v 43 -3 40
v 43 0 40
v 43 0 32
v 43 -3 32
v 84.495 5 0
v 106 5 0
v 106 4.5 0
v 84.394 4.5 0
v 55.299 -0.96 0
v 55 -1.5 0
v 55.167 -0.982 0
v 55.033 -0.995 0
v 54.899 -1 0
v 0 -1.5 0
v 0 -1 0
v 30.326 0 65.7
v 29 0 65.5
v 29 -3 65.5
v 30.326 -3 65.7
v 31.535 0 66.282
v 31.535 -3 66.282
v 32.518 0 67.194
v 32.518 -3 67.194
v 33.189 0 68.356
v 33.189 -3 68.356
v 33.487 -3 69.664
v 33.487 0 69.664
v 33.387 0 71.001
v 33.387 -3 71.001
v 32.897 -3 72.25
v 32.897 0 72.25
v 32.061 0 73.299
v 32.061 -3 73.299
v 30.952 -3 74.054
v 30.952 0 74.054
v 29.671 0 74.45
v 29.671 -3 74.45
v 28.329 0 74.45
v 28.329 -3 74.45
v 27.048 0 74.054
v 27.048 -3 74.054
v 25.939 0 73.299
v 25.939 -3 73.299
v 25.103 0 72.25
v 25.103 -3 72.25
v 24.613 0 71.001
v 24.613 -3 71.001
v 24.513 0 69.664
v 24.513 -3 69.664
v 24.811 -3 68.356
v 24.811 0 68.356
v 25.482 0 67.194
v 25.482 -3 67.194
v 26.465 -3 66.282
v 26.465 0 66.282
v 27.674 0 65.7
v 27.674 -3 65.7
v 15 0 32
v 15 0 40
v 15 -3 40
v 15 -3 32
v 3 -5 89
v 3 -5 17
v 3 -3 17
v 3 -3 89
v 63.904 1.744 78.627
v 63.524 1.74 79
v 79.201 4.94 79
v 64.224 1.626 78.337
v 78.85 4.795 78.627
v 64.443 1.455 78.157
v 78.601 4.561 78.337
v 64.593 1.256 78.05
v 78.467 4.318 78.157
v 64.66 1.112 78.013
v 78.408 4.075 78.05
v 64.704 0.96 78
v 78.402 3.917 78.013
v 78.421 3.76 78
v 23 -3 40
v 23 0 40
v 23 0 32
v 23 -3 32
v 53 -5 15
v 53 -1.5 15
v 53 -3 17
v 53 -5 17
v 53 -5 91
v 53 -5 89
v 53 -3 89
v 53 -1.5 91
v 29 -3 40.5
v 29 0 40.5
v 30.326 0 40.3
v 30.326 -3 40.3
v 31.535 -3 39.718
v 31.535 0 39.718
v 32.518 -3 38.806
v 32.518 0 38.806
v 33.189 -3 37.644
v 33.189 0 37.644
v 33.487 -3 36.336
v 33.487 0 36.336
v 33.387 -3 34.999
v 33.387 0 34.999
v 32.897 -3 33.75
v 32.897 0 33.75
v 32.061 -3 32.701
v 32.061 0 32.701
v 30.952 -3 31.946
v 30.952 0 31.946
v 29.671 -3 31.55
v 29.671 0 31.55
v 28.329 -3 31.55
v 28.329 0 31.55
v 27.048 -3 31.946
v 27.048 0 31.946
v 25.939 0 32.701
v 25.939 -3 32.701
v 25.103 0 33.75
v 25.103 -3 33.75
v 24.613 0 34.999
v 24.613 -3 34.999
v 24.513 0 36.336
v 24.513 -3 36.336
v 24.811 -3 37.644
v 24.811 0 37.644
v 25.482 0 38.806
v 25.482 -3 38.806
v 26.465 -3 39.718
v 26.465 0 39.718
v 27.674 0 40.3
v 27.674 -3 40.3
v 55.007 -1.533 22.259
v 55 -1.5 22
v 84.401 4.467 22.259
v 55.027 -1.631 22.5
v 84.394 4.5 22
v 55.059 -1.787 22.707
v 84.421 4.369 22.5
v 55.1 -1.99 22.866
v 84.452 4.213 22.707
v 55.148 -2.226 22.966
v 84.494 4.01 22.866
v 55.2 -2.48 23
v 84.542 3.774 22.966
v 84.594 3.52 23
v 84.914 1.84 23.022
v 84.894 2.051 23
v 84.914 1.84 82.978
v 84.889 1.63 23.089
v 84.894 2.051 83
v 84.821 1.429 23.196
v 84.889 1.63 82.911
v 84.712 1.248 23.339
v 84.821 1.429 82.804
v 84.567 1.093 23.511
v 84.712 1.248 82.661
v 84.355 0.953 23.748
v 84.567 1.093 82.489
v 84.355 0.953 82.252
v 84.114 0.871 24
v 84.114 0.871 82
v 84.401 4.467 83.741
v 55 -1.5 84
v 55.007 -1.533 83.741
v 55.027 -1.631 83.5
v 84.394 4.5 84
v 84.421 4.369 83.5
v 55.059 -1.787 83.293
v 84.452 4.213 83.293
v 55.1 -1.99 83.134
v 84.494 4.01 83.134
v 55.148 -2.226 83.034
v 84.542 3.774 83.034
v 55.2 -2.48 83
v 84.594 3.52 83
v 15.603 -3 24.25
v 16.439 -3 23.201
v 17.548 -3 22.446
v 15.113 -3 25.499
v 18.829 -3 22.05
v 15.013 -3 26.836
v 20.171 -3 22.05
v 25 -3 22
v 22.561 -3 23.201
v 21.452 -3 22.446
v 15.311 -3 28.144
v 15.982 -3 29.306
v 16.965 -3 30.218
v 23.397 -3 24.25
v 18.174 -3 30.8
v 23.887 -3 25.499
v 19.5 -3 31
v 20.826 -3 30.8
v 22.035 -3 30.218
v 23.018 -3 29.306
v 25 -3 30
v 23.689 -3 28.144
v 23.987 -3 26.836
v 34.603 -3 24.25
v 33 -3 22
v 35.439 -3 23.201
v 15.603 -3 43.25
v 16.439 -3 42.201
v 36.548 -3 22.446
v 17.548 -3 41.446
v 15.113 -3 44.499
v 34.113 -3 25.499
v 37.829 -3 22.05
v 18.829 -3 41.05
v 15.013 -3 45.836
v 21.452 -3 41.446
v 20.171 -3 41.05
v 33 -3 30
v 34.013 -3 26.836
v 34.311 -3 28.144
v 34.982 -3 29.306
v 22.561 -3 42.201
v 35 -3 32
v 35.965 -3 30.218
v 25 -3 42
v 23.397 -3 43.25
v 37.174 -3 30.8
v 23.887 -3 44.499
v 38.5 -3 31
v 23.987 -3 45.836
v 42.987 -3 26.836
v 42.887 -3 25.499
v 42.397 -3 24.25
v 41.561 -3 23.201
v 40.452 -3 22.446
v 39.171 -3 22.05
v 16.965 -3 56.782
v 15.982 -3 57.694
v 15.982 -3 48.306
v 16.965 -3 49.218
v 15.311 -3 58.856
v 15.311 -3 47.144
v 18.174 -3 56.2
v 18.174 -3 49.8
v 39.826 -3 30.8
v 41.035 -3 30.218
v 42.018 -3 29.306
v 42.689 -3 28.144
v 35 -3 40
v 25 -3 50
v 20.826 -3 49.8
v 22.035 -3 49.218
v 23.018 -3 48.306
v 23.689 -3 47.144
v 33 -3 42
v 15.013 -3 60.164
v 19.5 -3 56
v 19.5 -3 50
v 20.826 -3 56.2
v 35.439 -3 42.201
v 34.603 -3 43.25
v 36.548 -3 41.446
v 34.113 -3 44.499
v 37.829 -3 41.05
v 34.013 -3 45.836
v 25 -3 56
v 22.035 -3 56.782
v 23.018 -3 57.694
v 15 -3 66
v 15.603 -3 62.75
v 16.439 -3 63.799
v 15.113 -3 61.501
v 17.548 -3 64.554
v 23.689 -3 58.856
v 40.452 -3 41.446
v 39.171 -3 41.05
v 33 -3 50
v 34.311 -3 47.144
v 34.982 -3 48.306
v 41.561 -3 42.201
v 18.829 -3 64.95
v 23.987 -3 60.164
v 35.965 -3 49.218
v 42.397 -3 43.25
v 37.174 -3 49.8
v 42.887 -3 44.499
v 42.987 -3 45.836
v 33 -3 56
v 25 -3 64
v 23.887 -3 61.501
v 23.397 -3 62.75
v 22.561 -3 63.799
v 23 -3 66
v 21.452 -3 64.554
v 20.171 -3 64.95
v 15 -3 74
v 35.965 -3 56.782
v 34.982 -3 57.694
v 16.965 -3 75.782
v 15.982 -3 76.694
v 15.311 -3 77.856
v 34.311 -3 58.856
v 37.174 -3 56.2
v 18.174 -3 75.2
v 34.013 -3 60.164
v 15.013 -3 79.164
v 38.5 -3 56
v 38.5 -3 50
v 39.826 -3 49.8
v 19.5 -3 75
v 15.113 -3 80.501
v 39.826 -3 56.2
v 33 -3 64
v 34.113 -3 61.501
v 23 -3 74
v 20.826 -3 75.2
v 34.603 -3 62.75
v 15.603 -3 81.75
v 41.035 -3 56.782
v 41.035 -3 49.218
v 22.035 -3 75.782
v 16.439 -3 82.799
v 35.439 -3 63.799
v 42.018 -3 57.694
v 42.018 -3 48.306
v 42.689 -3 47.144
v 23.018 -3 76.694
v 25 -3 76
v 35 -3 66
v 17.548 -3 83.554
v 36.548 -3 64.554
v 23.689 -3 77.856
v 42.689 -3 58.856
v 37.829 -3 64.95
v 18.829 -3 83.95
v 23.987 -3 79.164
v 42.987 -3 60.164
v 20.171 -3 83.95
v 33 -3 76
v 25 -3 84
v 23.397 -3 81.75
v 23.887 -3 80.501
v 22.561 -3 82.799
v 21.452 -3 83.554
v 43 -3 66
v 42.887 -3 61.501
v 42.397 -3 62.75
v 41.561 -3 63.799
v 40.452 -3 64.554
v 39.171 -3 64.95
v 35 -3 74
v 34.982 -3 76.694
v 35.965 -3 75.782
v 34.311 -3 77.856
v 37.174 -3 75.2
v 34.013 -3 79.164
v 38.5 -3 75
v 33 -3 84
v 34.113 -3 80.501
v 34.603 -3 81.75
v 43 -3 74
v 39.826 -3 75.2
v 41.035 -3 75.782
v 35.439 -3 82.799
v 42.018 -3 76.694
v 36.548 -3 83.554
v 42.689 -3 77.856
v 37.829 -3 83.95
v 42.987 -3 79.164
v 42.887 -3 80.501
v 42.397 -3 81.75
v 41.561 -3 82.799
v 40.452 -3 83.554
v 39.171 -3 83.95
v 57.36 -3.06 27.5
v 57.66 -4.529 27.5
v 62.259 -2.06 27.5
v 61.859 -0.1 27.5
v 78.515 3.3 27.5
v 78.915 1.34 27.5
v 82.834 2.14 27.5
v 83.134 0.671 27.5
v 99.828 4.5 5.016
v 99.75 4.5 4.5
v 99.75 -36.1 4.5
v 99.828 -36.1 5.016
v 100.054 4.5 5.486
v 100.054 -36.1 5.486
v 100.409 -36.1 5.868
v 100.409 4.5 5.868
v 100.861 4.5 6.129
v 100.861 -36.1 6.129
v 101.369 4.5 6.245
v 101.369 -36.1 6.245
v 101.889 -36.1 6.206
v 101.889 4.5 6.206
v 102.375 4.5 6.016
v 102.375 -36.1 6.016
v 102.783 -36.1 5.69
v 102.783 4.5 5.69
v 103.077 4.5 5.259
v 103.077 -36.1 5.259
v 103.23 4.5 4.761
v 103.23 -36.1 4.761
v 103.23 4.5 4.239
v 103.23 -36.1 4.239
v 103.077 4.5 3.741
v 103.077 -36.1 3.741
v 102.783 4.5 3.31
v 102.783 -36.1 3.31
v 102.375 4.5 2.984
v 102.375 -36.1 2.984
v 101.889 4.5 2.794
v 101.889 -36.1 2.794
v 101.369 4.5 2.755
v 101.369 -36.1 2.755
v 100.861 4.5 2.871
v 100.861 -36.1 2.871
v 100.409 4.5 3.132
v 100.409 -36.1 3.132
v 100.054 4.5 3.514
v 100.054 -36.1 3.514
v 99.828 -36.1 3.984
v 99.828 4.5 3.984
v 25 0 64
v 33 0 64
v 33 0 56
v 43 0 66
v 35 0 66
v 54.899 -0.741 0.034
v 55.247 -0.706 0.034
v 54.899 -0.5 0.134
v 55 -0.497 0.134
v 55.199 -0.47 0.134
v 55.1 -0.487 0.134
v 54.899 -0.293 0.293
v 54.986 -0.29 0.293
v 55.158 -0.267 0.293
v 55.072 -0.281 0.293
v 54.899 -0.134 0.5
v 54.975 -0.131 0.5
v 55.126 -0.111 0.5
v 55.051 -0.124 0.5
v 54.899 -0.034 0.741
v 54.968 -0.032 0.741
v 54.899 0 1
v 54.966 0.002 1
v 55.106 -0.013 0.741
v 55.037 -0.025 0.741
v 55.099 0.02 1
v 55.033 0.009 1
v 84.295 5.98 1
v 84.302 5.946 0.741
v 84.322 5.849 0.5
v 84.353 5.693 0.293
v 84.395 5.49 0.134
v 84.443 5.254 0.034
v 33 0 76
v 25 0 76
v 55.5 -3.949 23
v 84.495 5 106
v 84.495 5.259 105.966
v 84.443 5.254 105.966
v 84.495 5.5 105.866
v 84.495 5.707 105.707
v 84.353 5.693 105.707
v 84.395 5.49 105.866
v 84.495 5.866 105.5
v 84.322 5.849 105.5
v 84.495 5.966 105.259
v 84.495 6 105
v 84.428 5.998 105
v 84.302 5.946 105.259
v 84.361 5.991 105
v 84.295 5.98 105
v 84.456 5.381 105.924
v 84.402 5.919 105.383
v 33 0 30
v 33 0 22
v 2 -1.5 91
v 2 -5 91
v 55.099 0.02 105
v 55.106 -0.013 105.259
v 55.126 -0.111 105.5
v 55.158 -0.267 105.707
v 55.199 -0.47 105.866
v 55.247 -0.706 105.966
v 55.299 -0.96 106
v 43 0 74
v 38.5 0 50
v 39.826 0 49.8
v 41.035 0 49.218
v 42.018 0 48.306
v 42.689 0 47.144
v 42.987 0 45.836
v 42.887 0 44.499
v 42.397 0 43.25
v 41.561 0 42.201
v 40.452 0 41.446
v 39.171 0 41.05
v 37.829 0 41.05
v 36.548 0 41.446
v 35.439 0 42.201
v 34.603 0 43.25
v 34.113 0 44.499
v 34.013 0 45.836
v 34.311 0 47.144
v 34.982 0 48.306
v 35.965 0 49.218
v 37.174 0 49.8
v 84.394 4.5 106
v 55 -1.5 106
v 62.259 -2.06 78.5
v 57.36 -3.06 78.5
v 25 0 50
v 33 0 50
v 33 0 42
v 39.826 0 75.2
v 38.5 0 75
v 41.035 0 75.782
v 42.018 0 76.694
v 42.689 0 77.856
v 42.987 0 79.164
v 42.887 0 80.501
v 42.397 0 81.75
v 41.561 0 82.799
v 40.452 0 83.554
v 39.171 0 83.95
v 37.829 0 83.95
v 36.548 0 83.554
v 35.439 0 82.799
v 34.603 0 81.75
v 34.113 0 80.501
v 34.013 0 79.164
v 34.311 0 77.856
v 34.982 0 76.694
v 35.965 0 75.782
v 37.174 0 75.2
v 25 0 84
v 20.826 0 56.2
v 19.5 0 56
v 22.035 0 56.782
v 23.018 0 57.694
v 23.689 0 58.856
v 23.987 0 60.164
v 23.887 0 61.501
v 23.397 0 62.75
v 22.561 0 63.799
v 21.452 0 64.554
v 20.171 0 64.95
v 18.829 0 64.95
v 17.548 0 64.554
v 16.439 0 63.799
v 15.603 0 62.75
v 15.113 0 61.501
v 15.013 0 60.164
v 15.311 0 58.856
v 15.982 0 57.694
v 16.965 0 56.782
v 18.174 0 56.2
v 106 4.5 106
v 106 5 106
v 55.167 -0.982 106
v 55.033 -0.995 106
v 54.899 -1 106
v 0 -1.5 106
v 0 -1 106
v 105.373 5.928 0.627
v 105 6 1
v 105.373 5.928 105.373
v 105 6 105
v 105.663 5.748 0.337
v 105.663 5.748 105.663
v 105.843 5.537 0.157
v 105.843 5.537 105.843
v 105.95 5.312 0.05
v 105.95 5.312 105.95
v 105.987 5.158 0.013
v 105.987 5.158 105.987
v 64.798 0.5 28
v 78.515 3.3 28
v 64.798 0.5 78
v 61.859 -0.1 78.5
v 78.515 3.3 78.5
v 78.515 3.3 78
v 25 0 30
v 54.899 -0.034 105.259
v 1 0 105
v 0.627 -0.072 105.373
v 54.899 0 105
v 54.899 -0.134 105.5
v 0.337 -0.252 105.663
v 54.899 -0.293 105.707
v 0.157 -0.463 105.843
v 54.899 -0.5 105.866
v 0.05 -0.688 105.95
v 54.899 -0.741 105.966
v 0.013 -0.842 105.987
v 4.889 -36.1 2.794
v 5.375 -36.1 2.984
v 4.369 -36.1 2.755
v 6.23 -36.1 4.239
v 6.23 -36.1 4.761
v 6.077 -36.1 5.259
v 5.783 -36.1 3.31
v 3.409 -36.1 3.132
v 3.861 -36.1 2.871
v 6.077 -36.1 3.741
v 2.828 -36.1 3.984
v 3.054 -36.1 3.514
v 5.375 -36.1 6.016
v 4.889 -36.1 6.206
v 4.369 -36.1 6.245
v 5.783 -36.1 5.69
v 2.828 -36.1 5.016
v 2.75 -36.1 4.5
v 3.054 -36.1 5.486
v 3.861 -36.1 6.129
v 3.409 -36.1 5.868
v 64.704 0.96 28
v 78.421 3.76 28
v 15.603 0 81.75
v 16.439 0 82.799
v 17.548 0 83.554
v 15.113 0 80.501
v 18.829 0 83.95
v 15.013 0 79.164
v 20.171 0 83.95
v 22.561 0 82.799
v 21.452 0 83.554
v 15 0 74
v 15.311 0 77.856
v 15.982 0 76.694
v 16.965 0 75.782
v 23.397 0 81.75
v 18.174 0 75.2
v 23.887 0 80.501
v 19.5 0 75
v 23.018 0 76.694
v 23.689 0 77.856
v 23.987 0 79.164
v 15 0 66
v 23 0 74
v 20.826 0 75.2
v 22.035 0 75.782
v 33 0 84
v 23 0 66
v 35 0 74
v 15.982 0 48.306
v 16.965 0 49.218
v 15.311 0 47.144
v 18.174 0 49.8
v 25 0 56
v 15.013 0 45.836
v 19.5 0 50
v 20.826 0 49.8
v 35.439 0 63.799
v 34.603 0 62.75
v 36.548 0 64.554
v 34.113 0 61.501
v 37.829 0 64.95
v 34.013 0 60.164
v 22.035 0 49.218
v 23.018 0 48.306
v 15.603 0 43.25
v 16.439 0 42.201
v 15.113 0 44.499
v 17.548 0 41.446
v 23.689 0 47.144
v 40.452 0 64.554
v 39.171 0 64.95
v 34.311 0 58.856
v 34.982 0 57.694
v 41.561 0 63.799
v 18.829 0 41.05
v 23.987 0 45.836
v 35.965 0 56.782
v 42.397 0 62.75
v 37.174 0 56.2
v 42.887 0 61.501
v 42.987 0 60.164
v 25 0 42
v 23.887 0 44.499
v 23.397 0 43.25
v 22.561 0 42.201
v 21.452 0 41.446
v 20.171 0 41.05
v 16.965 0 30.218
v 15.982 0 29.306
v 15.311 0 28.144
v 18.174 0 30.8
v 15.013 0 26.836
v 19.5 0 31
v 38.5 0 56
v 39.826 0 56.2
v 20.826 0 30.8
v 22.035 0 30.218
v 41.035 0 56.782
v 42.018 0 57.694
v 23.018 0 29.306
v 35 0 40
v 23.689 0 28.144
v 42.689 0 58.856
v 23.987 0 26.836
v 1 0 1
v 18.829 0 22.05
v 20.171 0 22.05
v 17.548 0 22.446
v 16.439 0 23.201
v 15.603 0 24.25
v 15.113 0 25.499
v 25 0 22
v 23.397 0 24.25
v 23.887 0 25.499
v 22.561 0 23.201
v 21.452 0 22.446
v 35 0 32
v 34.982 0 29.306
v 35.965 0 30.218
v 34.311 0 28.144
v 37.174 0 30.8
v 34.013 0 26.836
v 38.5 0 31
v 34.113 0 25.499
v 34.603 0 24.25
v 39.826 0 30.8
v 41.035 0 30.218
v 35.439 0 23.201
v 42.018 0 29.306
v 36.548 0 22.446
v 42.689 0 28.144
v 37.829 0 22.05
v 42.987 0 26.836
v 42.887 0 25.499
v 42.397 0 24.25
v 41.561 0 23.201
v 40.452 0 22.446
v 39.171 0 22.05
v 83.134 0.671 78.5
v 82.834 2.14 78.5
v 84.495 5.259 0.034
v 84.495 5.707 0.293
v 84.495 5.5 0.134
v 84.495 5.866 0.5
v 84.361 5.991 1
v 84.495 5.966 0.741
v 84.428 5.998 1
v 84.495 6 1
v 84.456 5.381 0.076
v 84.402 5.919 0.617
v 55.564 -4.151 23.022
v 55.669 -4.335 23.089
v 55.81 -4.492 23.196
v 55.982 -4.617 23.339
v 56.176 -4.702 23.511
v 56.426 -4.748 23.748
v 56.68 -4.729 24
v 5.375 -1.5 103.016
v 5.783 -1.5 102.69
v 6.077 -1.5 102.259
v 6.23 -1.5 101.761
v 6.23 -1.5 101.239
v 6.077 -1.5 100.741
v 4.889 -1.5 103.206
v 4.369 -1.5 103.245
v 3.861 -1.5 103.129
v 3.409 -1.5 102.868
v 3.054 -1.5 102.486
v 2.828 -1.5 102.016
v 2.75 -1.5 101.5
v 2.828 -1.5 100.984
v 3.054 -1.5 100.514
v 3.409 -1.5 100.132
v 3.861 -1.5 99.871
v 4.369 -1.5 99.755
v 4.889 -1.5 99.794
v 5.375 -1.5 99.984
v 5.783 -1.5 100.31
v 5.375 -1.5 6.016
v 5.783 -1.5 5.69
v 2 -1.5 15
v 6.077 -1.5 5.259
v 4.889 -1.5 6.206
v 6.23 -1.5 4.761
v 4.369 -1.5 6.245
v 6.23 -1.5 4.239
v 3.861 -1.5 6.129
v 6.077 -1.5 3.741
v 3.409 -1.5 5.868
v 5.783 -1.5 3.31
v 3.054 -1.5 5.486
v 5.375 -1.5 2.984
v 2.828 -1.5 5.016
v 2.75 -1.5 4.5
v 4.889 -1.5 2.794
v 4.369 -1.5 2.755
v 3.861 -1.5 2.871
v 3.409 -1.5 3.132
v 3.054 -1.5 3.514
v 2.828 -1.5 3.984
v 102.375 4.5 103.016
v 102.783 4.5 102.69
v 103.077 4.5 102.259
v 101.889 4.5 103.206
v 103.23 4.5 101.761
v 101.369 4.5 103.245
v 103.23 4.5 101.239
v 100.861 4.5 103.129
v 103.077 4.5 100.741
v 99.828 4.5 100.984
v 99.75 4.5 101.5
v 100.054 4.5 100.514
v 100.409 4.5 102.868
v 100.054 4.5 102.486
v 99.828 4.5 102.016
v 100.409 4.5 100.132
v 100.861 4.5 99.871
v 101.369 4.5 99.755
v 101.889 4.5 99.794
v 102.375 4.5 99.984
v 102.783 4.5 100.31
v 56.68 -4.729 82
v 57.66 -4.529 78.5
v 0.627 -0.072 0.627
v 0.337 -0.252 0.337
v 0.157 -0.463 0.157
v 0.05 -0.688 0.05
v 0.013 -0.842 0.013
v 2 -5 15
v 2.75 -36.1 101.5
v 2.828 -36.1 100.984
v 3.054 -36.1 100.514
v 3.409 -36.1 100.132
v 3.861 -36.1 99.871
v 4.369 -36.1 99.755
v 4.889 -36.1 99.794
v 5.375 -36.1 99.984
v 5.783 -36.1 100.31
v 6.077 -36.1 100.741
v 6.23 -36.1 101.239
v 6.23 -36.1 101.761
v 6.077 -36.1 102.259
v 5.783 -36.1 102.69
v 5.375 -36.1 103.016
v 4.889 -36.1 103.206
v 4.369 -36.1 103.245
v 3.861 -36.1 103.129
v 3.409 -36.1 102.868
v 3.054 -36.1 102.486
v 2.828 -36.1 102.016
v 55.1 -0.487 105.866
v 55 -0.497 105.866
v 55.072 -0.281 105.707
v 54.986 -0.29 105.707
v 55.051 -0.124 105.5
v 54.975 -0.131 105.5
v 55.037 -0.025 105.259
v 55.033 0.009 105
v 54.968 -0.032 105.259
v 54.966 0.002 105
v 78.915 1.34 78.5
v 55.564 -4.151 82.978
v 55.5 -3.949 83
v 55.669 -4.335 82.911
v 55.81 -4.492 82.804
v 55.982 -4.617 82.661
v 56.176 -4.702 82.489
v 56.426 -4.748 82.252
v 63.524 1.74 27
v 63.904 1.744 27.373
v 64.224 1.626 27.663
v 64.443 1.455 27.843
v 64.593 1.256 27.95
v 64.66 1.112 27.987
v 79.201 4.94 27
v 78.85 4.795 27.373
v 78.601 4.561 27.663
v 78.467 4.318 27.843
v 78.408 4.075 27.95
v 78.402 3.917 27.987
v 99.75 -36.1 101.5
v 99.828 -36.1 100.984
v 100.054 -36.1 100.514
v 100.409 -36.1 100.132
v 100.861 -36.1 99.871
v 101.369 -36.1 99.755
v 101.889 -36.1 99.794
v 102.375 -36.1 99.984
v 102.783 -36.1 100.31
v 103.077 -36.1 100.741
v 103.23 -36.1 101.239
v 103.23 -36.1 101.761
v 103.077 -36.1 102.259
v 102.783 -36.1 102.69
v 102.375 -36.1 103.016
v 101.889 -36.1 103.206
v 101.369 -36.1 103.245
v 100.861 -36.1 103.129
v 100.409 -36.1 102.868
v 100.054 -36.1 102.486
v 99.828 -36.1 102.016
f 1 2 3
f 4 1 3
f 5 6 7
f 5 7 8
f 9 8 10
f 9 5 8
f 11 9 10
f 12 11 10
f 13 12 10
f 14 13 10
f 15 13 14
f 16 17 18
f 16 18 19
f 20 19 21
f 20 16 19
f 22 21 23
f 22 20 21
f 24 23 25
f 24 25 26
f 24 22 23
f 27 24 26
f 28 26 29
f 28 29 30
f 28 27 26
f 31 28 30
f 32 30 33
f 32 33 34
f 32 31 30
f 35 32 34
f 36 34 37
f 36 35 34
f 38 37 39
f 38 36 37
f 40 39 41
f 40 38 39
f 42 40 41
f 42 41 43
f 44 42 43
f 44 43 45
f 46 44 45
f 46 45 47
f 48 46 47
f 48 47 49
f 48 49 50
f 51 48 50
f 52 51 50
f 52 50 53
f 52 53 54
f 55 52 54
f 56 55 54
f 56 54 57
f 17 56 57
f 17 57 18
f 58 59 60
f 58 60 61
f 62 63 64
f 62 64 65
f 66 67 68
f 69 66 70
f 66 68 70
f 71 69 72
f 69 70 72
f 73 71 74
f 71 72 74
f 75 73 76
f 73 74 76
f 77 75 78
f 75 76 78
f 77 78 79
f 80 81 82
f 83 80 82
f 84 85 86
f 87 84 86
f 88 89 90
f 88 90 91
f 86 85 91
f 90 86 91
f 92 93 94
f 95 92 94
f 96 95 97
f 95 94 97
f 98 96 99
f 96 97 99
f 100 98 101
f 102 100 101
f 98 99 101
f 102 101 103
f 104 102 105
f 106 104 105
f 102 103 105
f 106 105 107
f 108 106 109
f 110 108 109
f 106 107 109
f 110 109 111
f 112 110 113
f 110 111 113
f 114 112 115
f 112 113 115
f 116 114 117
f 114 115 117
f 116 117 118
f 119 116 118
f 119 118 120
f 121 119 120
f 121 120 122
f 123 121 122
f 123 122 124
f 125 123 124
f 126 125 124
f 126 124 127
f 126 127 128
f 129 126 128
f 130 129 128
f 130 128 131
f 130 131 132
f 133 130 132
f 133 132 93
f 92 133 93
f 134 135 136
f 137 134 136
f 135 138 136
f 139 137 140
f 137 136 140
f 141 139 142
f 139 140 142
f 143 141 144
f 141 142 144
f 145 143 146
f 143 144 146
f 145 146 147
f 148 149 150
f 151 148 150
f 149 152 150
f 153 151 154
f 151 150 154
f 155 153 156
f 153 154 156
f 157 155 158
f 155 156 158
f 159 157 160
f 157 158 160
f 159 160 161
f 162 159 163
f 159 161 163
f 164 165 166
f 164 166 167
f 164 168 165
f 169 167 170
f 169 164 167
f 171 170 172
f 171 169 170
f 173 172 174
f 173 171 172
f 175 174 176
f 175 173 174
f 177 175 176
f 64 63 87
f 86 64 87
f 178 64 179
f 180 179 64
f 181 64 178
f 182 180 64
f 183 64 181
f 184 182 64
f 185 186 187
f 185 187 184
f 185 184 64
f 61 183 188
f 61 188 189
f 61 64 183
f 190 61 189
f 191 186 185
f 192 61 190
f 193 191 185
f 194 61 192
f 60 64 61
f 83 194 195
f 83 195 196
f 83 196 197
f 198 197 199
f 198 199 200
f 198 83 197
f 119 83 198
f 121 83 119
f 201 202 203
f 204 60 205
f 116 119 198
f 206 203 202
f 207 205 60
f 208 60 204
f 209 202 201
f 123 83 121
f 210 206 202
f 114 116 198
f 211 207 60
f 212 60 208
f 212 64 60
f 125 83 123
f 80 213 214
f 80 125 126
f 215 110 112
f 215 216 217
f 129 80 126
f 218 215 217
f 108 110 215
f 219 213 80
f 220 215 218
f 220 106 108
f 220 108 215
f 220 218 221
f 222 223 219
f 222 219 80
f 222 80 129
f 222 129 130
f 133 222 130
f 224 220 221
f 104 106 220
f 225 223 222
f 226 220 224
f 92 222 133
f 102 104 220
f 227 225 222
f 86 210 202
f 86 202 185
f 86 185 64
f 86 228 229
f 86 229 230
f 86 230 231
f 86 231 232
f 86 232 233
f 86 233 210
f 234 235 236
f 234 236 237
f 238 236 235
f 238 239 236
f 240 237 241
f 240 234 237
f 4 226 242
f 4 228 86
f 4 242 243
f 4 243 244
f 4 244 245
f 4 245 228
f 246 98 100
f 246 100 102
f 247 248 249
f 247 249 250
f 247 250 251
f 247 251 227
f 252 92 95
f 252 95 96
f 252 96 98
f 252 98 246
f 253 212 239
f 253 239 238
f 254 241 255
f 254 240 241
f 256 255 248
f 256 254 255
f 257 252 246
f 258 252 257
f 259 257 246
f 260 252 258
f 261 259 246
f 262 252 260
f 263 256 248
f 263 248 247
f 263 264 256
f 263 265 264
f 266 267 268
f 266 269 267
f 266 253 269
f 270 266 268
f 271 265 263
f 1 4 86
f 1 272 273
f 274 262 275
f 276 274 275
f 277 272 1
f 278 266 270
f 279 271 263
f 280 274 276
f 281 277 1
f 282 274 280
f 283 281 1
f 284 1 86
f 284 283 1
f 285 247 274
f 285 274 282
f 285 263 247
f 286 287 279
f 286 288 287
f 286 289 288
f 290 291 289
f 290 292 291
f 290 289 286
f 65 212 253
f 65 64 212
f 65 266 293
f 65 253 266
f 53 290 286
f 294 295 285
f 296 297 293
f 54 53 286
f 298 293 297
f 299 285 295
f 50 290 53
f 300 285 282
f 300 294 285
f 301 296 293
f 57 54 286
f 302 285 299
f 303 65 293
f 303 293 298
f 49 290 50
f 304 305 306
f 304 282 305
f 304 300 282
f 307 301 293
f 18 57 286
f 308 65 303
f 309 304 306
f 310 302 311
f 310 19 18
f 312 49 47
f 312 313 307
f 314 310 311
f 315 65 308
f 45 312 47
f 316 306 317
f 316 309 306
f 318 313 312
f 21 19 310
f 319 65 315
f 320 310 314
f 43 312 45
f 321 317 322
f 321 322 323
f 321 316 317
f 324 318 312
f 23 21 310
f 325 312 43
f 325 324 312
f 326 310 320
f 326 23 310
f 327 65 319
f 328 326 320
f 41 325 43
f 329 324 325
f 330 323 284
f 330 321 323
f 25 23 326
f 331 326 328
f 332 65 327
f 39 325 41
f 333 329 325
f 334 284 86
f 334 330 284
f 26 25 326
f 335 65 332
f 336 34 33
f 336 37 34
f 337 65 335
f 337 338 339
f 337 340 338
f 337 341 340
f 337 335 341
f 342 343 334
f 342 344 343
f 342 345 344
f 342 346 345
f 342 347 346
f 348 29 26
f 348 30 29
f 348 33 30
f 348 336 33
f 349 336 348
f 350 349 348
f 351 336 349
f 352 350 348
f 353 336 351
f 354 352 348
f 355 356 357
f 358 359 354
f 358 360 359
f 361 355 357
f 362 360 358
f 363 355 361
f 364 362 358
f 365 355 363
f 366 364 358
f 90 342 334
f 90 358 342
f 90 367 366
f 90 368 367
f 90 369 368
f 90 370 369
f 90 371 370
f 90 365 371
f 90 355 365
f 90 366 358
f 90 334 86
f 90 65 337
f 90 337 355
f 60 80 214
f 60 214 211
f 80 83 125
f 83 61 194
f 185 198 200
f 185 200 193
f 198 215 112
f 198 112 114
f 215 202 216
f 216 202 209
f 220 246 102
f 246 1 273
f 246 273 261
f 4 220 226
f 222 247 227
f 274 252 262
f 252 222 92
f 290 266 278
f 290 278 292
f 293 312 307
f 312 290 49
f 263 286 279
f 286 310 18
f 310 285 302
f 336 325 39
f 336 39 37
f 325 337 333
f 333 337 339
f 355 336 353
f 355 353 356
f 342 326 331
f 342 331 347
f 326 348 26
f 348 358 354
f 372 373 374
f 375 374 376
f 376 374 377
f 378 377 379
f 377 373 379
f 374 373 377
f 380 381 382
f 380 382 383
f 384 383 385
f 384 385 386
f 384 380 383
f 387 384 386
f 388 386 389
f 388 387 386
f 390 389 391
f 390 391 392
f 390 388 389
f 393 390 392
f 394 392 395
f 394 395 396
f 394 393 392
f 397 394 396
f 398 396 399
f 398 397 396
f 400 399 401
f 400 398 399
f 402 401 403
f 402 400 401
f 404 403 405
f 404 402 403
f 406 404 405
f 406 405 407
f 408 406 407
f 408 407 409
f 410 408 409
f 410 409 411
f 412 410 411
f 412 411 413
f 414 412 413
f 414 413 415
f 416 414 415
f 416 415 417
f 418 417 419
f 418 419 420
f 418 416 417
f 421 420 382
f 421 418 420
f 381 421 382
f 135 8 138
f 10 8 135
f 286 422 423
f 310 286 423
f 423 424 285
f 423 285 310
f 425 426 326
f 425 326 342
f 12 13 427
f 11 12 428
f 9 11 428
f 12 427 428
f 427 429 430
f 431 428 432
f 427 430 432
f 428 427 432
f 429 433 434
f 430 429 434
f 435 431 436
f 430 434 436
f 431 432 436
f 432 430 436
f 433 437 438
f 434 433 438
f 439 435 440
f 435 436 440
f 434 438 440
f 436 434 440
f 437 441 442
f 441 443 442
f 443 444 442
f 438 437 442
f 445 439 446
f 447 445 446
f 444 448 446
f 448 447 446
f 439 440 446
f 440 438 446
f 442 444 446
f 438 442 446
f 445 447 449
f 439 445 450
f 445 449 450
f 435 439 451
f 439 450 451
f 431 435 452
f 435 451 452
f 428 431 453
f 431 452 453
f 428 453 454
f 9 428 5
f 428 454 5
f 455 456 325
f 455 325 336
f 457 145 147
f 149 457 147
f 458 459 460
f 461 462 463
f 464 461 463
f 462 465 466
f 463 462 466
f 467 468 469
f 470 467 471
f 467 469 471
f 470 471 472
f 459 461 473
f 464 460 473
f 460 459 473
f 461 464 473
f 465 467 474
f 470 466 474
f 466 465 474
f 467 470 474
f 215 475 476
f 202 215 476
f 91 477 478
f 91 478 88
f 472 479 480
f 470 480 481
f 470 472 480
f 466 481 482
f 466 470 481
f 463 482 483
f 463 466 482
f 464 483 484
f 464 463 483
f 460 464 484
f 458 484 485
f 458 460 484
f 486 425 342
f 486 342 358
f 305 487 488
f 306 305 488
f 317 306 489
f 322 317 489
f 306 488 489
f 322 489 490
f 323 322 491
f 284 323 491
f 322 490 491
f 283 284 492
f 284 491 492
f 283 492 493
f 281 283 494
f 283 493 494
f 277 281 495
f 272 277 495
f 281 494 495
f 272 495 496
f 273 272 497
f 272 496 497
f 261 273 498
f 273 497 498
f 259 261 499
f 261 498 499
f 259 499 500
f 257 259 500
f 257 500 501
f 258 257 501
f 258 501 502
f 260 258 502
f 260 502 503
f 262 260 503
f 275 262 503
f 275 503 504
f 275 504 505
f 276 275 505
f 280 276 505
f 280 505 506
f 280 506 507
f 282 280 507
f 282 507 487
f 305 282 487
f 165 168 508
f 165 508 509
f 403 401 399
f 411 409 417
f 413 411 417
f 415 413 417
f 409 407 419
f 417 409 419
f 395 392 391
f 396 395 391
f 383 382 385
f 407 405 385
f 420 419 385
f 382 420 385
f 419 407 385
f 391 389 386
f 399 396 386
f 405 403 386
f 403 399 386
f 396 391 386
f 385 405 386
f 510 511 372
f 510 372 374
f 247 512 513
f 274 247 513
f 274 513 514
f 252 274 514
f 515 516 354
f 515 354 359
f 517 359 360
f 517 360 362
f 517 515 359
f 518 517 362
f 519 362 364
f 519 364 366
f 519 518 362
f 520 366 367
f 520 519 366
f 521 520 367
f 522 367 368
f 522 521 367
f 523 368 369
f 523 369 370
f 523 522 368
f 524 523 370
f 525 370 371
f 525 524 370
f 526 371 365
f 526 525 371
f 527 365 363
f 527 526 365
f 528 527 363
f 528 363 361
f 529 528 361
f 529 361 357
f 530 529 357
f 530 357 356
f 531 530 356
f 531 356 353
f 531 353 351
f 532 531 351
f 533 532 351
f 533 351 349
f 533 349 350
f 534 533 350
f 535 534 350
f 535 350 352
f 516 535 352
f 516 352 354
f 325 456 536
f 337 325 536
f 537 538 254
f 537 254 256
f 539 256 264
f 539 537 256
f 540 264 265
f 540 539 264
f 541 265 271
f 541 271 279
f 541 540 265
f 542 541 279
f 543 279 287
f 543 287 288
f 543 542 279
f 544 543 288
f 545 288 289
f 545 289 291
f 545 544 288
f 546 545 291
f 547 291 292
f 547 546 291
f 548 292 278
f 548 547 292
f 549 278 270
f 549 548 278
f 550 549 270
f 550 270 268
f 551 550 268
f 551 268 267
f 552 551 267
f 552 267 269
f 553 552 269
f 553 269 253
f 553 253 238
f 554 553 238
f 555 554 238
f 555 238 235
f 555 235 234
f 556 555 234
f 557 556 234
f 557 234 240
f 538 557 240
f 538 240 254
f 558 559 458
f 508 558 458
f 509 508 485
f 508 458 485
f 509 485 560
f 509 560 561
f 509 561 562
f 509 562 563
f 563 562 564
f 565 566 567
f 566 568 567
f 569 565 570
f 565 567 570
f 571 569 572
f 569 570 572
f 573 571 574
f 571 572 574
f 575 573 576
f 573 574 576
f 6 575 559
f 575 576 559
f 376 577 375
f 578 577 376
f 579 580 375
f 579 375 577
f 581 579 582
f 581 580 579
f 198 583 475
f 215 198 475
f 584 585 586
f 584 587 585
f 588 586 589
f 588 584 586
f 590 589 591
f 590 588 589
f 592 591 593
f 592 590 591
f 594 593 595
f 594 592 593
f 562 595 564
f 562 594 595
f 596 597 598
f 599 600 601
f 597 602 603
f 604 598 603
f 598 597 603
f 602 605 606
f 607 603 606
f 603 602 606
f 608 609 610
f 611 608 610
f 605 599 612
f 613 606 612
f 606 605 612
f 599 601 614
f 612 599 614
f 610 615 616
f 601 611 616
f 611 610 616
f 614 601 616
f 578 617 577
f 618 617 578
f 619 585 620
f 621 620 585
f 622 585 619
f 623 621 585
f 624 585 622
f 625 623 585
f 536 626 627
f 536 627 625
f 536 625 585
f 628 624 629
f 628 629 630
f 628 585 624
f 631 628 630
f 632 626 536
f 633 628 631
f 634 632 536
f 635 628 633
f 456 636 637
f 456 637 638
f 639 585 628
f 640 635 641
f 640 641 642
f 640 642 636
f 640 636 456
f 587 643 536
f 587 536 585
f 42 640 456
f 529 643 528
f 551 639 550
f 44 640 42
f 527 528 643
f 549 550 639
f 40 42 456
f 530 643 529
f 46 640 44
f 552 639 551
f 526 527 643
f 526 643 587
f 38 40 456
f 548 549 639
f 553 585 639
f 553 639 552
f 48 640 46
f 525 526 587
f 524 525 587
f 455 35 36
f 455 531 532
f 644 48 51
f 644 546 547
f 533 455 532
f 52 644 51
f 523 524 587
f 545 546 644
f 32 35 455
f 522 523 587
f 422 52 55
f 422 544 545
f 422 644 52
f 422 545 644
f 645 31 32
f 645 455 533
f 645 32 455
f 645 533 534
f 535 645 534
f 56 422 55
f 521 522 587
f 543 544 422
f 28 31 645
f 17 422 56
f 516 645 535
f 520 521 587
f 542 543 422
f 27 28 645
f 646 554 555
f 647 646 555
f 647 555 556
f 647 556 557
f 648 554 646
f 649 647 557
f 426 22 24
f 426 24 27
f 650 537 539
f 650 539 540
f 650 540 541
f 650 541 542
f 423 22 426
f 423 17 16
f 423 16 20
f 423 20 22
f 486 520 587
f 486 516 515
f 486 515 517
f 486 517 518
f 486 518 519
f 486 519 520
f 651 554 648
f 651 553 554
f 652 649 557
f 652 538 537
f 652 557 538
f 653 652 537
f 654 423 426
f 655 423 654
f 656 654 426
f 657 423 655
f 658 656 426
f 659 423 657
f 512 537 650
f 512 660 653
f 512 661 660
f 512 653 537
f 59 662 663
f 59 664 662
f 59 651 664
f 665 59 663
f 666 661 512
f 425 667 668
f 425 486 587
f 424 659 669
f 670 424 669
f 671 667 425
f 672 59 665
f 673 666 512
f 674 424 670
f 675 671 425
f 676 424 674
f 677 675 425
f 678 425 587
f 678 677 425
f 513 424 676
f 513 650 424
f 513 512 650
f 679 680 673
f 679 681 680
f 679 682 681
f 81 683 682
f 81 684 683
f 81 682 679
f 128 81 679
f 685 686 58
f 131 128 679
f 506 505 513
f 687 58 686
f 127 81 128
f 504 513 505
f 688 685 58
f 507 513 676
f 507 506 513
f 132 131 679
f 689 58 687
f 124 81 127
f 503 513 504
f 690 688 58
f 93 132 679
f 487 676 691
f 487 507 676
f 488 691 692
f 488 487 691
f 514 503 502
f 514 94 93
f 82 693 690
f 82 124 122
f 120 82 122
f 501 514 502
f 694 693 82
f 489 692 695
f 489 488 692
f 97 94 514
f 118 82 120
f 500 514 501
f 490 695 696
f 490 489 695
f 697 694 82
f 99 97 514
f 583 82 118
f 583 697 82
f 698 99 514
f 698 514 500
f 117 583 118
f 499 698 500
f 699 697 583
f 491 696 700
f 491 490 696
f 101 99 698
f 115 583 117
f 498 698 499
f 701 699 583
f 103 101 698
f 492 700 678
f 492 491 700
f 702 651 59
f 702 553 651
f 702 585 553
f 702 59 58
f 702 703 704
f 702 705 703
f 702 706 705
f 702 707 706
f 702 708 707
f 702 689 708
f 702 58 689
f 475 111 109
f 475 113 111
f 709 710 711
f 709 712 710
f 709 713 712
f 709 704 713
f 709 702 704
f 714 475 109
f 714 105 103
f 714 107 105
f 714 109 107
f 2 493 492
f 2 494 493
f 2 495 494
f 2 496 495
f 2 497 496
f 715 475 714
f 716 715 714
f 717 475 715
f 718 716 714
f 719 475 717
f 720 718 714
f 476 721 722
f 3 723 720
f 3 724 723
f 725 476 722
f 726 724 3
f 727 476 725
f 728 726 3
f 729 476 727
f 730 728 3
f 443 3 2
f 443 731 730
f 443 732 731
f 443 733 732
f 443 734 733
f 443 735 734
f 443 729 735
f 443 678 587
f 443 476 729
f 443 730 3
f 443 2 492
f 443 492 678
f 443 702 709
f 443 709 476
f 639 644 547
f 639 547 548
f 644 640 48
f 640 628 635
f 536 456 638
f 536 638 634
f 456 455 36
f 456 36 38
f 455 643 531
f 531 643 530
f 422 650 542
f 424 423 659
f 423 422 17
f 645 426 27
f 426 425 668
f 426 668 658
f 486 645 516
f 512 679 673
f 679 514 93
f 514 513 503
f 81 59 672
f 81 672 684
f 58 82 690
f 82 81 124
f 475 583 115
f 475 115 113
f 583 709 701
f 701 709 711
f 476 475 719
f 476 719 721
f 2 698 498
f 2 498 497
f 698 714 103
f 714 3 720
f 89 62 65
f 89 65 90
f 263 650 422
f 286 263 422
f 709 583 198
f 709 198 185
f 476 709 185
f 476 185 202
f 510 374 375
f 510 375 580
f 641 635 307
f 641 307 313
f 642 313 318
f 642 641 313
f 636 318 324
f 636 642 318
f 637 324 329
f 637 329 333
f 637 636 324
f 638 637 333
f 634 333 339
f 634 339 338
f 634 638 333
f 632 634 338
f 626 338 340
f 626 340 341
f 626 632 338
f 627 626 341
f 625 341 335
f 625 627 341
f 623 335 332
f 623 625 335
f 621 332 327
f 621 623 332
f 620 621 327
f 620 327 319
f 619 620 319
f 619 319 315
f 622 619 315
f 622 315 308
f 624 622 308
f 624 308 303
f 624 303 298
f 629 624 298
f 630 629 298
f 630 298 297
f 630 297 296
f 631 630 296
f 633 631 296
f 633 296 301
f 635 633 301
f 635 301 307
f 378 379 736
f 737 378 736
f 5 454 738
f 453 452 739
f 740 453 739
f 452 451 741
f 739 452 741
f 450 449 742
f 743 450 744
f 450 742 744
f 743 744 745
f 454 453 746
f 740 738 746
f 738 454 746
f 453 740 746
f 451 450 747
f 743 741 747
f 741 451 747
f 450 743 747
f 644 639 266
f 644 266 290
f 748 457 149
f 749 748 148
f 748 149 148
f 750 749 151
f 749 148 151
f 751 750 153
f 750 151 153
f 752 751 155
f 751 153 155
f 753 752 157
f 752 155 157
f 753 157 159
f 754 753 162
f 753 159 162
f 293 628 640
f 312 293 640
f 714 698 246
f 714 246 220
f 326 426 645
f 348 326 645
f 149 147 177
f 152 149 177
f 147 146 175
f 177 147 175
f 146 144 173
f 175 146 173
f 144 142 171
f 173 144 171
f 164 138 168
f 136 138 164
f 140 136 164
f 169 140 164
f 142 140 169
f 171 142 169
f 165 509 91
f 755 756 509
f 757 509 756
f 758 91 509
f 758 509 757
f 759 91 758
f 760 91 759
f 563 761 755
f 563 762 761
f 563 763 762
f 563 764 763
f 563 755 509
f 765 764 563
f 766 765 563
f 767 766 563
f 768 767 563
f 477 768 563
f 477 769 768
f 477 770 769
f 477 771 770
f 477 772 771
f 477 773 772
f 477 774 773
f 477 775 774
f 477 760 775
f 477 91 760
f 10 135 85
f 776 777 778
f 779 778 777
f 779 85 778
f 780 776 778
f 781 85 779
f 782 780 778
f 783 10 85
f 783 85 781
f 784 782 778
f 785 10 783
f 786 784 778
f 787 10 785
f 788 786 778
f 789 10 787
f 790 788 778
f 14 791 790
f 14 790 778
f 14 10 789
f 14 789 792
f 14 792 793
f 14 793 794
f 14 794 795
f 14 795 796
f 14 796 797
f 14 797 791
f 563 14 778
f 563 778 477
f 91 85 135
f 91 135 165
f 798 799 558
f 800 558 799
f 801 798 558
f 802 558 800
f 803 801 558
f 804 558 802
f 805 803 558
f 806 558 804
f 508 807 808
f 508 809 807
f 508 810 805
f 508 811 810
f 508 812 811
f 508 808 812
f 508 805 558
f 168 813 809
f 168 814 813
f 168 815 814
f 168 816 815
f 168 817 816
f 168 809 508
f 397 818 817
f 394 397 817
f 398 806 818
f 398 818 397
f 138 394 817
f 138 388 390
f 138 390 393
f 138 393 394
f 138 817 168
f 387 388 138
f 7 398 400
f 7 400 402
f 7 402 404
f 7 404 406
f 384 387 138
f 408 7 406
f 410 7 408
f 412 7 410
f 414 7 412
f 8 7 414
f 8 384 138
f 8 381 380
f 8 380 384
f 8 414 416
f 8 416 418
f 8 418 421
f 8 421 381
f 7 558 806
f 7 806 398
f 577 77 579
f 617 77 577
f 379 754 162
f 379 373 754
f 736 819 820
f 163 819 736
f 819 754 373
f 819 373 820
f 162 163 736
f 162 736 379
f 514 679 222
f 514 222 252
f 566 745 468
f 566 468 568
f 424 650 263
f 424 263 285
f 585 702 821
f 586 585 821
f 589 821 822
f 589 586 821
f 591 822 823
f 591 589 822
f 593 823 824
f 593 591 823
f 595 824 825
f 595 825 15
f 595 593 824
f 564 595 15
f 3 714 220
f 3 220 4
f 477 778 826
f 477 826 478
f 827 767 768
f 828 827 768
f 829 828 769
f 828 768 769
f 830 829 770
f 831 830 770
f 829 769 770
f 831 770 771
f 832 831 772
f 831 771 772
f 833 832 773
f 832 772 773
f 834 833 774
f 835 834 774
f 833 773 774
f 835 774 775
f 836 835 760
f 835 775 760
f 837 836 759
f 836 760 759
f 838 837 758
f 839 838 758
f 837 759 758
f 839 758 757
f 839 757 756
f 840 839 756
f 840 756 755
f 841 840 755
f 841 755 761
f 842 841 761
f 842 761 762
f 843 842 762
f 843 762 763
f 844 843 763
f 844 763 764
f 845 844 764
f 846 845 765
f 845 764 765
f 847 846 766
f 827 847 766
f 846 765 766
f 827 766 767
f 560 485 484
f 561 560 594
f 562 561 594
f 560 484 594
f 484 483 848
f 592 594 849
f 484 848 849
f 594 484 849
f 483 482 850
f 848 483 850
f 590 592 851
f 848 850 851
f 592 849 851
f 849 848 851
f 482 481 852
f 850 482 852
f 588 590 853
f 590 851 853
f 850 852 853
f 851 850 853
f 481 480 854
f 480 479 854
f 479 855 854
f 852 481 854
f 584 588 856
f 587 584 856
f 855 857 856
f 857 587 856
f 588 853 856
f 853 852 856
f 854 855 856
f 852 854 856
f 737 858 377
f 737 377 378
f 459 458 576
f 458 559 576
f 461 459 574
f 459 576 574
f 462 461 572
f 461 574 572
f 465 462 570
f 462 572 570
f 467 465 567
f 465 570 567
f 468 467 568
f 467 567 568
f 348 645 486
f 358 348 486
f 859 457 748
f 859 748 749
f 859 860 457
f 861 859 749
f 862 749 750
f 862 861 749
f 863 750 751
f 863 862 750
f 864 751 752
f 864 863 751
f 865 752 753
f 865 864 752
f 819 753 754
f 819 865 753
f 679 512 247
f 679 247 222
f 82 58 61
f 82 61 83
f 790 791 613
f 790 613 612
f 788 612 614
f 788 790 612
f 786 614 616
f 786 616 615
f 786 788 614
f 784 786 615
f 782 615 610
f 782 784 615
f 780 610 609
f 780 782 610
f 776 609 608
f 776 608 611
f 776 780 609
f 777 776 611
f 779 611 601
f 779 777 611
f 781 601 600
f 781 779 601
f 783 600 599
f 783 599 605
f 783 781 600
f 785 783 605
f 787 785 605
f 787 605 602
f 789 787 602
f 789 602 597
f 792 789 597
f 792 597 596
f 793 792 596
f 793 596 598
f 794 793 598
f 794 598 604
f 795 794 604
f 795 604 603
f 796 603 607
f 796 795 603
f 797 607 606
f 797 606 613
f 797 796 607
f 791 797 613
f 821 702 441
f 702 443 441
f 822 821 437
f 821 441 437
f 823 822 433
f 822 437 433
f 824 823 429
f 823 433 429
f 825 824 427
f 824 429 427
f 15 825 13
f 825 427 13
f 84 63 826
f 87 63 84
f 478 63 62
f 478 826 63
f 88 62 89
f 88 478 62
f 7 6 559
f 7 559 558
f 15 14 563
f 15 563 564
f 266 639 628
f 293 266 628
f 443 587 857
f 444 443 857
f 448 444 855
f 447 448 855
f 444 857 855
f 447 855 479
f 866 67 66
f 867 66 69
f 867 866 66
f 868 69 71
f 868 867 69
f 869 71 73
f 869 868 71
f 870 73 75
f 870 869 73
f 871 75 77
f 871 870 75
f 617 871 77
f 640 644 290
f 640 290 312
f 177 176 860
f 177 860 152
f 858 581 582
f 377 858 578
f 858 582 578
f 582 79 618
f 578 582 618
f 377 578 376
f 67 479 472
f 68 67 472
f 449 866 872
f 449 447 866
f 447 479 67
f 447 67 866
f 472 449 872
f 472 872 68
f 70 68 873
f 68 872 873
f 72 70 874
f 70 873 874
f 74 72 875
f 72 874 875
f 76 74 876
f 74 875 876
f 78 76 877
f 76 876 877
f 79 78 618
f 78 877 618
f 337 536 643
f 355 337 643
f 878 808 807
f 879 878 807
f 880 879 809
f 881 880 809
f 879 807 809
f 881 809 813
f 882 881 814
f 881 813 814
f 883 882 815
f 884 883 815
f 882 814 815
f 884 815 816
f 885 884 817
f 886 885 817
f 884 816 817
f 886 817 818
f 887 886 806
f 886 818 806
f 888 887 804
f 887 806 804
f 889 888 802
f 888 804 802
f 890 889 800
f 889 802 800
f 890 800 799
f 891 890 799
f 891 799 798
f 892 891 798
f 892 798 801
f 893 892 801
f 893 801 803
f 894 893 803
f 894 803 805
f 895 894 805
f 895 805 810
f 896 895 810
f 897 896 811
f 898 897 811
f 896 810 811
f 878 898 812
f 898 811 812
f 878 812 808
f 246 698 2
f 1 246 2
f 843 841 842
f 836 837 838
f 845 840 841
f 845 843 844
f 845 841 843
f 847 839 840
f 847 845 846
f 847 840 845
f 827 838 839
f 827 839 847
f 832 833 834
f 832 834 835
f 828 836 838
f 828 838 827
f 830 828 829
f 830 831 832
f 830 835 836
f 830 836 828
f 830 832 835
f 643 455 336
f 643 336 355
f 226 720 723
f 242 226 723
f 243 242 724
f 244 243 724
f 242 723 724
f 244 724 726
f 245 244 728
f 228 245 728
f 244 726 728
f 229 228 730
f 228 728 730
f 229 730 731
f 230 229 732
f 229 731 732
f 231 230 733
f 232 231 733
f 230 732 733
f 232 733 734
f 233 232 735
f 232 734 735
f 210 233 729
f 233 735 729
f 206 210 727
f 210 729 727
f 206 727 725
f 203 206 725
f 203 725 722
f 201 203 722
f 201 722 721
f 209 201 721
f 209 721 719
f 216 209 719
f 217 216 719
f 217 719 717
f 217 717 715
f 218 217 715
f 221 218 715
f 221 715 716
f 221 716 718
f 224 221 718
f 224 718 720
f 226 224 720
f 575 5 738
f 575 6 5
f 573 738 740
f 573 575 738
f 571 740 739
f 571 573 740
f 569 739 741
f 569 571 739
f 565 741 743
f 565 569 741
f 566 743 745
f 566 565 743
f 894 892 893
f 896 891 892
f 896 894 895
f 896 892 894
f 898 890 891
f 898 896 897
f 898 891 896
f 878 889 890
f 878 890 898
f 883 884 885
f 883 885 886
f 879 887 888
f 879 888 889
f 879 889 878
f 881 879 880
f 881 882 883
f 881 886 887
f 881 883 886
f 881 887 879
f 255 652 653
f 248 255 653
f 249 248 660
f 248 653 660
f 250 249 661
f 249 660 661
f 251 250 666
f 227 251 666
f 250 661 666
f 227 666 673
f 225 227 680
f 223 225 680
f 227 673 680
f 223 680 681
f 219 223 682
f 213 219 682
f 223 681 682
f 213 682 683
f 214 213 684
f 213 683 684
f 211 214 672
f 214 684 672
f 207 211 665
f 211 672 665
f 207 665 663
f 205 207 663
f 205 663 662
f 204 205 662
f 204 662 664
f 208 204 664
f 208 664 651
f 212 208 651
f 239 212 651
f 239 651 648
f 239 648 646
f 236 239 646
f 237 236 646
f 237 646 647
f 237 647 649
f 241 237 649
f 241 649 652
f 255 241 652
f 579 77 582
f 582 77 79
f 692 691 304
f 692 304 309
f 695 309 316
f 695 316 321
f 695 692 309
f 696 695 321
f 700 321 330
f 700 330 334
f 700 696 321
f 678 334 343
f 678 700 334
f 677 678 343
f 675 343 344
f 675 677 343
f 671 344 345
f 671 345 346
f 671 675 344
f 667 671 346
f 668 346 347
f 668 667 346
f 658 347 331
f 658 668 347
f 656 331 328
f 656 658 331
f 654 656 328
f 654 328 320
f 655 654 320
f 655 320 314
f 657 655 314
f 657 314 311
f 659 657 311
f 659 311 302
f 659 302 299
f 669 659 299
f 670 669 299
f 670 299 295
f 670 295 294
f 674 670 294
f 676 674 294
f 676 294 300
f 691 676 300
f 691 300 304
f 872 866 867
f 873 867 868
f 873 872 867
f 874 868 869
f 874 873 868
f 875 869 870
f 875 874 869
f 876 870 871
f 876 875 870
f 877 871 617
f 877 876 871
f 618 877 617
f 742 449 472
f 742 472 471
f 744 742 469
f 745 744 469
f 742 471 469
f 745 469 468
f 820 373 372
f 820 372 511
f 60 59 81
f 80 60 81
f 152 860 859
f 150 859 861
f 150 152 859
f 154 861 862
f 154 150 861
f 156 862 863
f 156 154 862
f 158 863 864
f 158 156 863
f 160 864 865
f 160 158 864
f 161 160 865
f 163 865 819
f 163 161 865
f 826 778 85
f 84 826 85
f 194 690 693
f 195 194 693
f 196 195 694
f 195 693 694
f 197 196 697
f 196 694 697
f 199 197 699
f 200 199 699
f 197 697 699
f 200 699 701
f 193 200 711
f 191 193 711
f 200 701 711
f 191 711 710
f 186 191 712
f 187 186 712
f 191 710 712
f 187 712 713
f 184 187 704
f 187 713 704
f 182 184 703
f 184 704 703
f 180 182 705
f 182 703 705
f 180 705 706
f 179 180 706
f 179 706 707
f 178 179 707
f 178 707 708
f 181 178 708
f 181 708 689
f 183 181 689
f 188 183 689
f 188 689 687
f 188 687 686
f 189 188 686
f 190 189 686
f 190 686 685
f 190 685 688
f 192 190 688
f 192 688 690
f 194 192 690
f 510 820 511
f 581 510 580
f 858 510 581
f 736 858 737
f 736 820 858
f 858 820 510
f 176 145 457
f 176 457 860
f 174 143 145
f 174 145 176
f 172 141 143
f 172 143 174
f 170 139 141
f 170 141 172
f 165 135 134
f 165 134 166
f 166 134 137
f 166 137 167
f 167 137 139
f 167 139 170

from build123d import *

# Parameters (mm, degrees)
EXTRUDE_1_DEPTH     = 106
SKETCH_4_R          = 1.75
EXTRUDE_2_DEPTH     = 34.6
SKETCH_5_R          = 1.75
EXTRUDE_3_DEPTH     = 40.6
SKETCH_8_W          = 30
SKETCH_8_H          = 60
EXTRUDE_4_DEPTH     = 3.5
SKETCH_9_W          = 26
SKETCH_9_H          = 51
CUT_EXTRUDE_1_DEPTH = 1.5
SKETCH_10_W         = 17
SKETCH_10_H         = 51
CUT_EXTRUDE_2_DEPTH = 2
CUT_EXTRUDE_4_REACH = 152.505
SKETCH_11_W         = 14
SKETCH_11_H         = 50
FILLET_3_R          = 1
FILLET_4_R          = 1
SKETCH_13_W         = 51
SKETCH_13_H         = 76
EXTRUDE_5_DEPTH     = 3.5
SKETCH_14_W         = 50
SKETCH_14_H         = 72
CUT_EXTRUDE_5_DEPTH = 2
CUT_EXTRUDE_7_REACH = 156.192
SKETCH_15_R         = 4.5
SKETCH_15_W         = 8
SKETCH_15_H         = 8


with BuildPart() as part:
    # 草图2 → 凸台-拉伸1 (new body)
    with BuildSketch(Plane.XY):
        Polygon((0, 0), (55, 0), (84.393876913, 6), (106, 6), (106, 4.5), (84.393876913, 4.5), (55, -1.5), (0, -1.5), align=None)
    extrude(amount=EXTRUDE_1_DEPTH)

    # 草图4 → 凸台-拉伸2 (add)
    with BuildSketch(Plane.XZ.offset(1.5)):
        with Locations(Location((4.5, 101.5, 0), (0, 0, 180))):
            Circle(SKETCH_4_R)
    extrude_2 = extrude(amount=EXTRUDE_2_DEPTH)

    # 草图5 → 凸台-拉伸3 (add)
    with BuildSketch(Plane.XZ.offset(-4.5)):
        with Locations(Location((101.5, 101.5, 0), (0, 0, 180))):
            Circle(SKETCH_5_R)
    extrude_3 = extrude(amount=EXTRUDE_3_DEPTH)

    # 镜向1: 凸台-拉伸2, 凸台-拉伸3 across plane
    add(extrude_2.mirror(Plane.XY.offset(53)))
    add(extrude_3.mirror(Plane.XY.offset(53)))

    # 草图8 → 凸台-拉伸4 (add)
    with BuildSketch(Plane(origin=(2.493938769, -12.217754868, 0), x_dir=(0.9797958971132713, 0.20000000000000007, 0), z_dir=(0.20000000000000007, -0.9797958971132713, 0))):
        with Locations((68.588774341, 53)):
            Rectangle(SKETCH_8_W, SKETCH_8_H)
    extrude(amount=EXTRUDE_4_DEPTH)

    # 草图9 → 切除-拉伸1 (cut)
    with BuildSketch(Plane(origin=(3.193938769, -15.647040508, 0), x_dir=(0.9797958971132713, 0.19999999999999998, 0), z_dir=(0.19999999999999998, -0.9797958971132713, 0))):
        with Locations((68.588774341, 53)):
            Rectangle(SKETCH_9_W, SKETCH_9_H)
    extrude(amount=-CUT_EXTRUDE_1_DEPTH, mode=Mode.SUBTRACT)

    # 草图10 → 切除-拉伸2 (cut)
    with BuildSketch(Plane(origin=(2.893938769, -14.177346662, 0), x_dir=(0.9797958971132713, 0.19999999999999998, 0), z_dir=(0.19999999999999998, -0.9797958971132713, 0))):
        with Locations((69.088774341, 53)):
            Rectangle(SKETCH_10_W, SKETCH_10_H)
    extrude(amount=-CUT_EXTRUDE_2_DEPTH, mode=Mode.SUBTRACT)

    # 草图11 → 切除-拉伸4 (cut, up to next)
    with BuildSketch(Plane(origin=(2.2, -10.777754868, 0), x_dir=(0.9797958971132713, 0.20000000000000007, 0), z_dir=(-0.20000000000000007, 0.9797958971132713, 0)), mode=Mode.PRIVATE) as cut_extrude_4_sk1:
        with Locations((70.588774341, -53)):
            Rectangle(SKETCH_11_W, SKETCH_11_H)
    cut_extrude_4_tool1 = extrude(cut_extrude_4_sk1.sketch, amount=-CUT_EXTRUDE_4_REACH, mode=Mode.PRIVATE) & part.part
    add(cut_extrude_4_tool1.solids().sort_by_distance((71.362591, 3.34, 53))[0], mode=Mode.SUBTRACT)

    # 圆角3
    fillet_3_edges = [part.edges().sort_by_distance(p)[0] for p in [
        (0, 0, 53),
        (55, 0, 53),
        (84.393876913, 6, 53),
        (106, 6, 53),
        (95.196938457, 6, 106),
        (69.696938457, 3, 106),
        (27.5, 0, 106),
        (27.5, 0, 0),
        (69.696938457, 3, 0),
        (95.196938457, 6, 0),
        (64.504020202, 1.94, 53),
        (71.362591482, 3.34, 78),
        (78.221162762, 4.74, 53),
        (71.362591482, 3.34, 28),
    ]]
    fillet(fillet_3_edges, radius=FILLET_3_R)

    # 圆角4
    fillet_4_edges = [part.edges().sort_by_distance(p)[0] for p in [
        (69.696938457, 1.5, 23),
        (69.696938457, 1.5, 83),
        (55.7, -4.92928564, 53),
        (70.396938457, -1.92928564, 23),
        (85.093876913, 1.07071436, 53),
        (70.396938457, -1.92928564, 83),
    ]]
    fillet(fillet_4_edges, radius=FILLET_4_R)

    # 草图13 → 凸台-拉伸5 (add)
    with BuildSketch(Plane.XZ.offset(1.5)):
        with Locations((27.5, 53)):
            Rectangle(SKETCH_13_W, SKETCH_13_H)
    extrude(amount=EXTRUDE_5_DEPTH)

    # 草图14 → 切除-拉伸5 (cut)
    with BuildSketch(Plane.XZ.offset(5)):
        with Locations((28, 53)):
            Rectangle(SKETCH_14_W, SKETCH_14_H)
    extrude(amount=-CUT_EXTRUDE_5_DEPTH, mode=Mode.SUBTRACT)

    # 草图15 → 切除-拉伸7 (cut, up to next)
    with BuildSketch(Plane(origin=(0, 0, 0), x_dir=(1, 0, 0), z_dir=(0, 1, 0)), mode=Mode.PRIVATE) as cut_extrude_7_sk1:
        with Locations(Location((29, -36, 0), (0, 0, 270))):
            Circle(SKETCH_15_R)
    cut_extrude_7_tool1 = extrude(cut_extrude_7_sk1.sketch, amount=-CUT_EXTRUDE_7_REACH, mode=Mode.PRIVATE) & part.part
    # 草图15 → 切除-拉伸7 (cut, up to next)
    with BuildSketch(Plane(origin=(0, 0, 0), x_dir=(1, 0, 0), z_dir=(0, 1, 0)), mode=Mode.PRIVATE) as cut_extrude_7_sk2:
        with Locations(Location((38.5, -26.5, 0), (0, 0, 270))):
            Circle(SKETCH_15_R)
    cut_extrude_7_tool2 = extrude(cut_extrude_7_sk2.sketch, amount=-CUT_EXTRUDE_7_REACH, mode=Mode.PRIVATE) & part.part
    # 草图15 → 切除-拉伸7 (cut, up to next)
    with BuildSketch(Plane(origin=(0, 0, 0), x_dir=(1, 0, 0), z_dir=(0, 1, 0)), mode=Mode.PRIVATE) as cut_extrude_7_sk3:
        with Locations(Location((38.5, -45.5, 0), (0, 0, 270))):
            Circle(SKETCH_15_R)
    cut_extrude_7_tool3 = extrude(cut_extrude_7_sk3.sketch, amount=-CUT_EXTRUDE_7_REACH, mode=Mode.PRIVATE) & part.part
    # 草图15 → 切除-拉伸7 (cut, up to next)
    with BuildSketch(Plane(origin=(0, 0, 0), x_dir=(1, 0, 0), z_dir=(0, 1, 0)), mode=Mode.PRIVATE) as cut_extrude_7_sk4:
        with Locations(Location((19.5, -26.5, 0), (0, 0, 270))):
            Circle(SKETCH_15_R)
    cut_extrude_7_tool4 = extrude(cut_extrude_7_sk4.sketch, amount=-CUT_EXTRUDE_7_REACH, mode=Mode.PRIVATE) & part.part
    # 草图15 → 切除-拉伸7 (cut, up to next)
    with BuildSketch(Plane(origin=(0, 0, 0), x_dir=(1, 0, 0), z_dir=(0, 1, 0)), mode=Mode.PRIVATE) as cut_extrude_7_sk5:
        with Locations(Location((19.5, -45.5, 0), (0, 0, 270))):
            Circle(SKETCH_15_R)
    cut_extrude_7_tool5 = extrude(cut_extrude_7_sk5.sketch, amount=-CUT_EXTRUDE_7_REACH, mode=Mode.PRIVATE) & part.part
    # 草图15 → 切除-拉伸7 (cut, up to next)
    with BuildSketch(Plane(origin=(0, 0, 0), x_dir=(1, 0, 0), z_dir=(0, 1, 0)), mode=Mode.PRIVATE) as cut_extrude_7_sk6:
        with Locations((39, -36)):
            Rectangle(SKETCH_15_W, SKETCH_15_H)
    cut_extrude_7_tool6 = extrude(cut_extrude_7_sk6.sketch, amount=-CUT_EXTRUDE_7_REACH, mode=Mode.PRIVATE) & part.part
    # 草图15 → 切除-拉伸7 (cut, up to next)
    with BuildSketch(Plane(origin=(0, 0, 0), x_dir=(1, 0, 0), z_dir=(0, 1, 0)), mode=Mode.PRIVATE) as cut_extrude_7_sk7:
        with Locations((29, -26)):
            Rectangle(SKETCH_15_W, SKETCH_15_H)
    cut_extrude_7_tool7 = extrude(cut_extrude_7_sk7.sketch, amount=-CUT_EXTRUDE_7_REACH, mode=Mode.PRIVATE) & part.part
    # 草图15 → 切除-拉伸7 (cut, up to next)
    with BuildSketch(Plane(origin=(0, 0, 0), x_dir=(1, 0, 0), z_dir=(0, 1, 0)), mode=Mode.PRIVATE) as cut_extrude_7_sk8:
        with Locations((29, -46)):
            Rectangle(SKETCH_15_W, SKETCH_15_H)
    cut_extrude_7_tool8 = extrude(cut_extrude_7_sk8.sketch, amount=-CUT_EXTRUDE_7_REACH, mode=Mode.PRIVATE) & part.part
    # 草图15 → 切除-拉伸7 (cut, up to next)
    with BuildSketch(Plane(origin=(0, 0, 0), x_dir=(1, 0, 0), z_dir=(0, 1, 0)), mode=Mode.PRIVATE) as cut_extrude_7_sk9:
        with Locations((19, -36)):
            Rectangle(SKETCH_15_W, SKETCH_15_H)
    cut_extrude_7_tool9 = extrude(cut_extrude_7_sk9.sketch, amount=-CUT_EXTRUDE_7_REACH, mode=Mode.PRIVATE) & part.part
    cut_extrude_7_1 = cut_extrude_7_tool1.solids().sort_by_distance((29, 0, 36))[0]
    add(cut_extrude_7_1, mode=Mode.SUBTRACT)
    cut_extrude_7_2 = cut_extrude_7_tool2.solids().sort_by_distance((38.5, 0, 26.5))[0]
    add(cut_extrude_7_2, mode=Mode.SUBTRACT)
    cut_extrude_7_3 = cut_extrude_7_tool3.solids().sort_by_distance((38.5, 0, 45.5))[0]
    add(cut_extrude_7_3, mode=Mode.SUBTRACT)
    cut_extrude_7_4 = cut_extrude_7_tool4.solids().sort_by_distance((19.5, 0, 26.5))[0]
    add(cut_extrude_7_4, mode=Mode.SUBTRACT)
    cut_extrude_7_5 = cut_extrude_7_tool5.solids().sort_by_distance((19.5, 0, 45.5))[0]
    add(cut_extrude_7_5, mode=Mode.SUBTRACT)
    cut_extrude_7_6 = cut_extrude_7_tool6.solids().sort_by_distance((39, 0, 36))[0]
    add(cut_extrude_7_6, mode=Mode.SUBTRACT)
    cut_extrude_7_7 = cut_extrude_7_tool7.solids().sort_by_distance((29, 0, 26))[0]
    add(cut_extrude_7_7, mode=Mode.SUBTRACT)
    cut_extrude_7_8 = cut_extrude_7_tool8.solids().sort_by_distance((29, 0, 46))[0]
    add(cut_extrude_7_8, mode=Mode.SUBTRACT)
    cut_extrude_7_9 = cut_extrude_7_tool9.solids().sort_by_distance((19, 0, 36))[0]
    add(cut_extrude_7_9, mode=Mode.SUBTRACT)
    cut_extrude_7 = cut_extrude_7_1 + cut_extrude_7_2 + cut_extrude_7_3 + cut_extrude_7_4 + cut_extrude_7_5 + cut_extrude_7_6 + cut_extrude_7_7 + cut_extrude_7_8 + cut_extrude_7_9  # 切除-拉伸7 as one shape, for the pattern or mirror that repeats it

    # 镜向2: 切除-拉伸7 across plane
    add(cut_extrude_7.mirror(Plane.XY.offset(53)), mode=Mode.SUBTRACT)


solid = part.part
